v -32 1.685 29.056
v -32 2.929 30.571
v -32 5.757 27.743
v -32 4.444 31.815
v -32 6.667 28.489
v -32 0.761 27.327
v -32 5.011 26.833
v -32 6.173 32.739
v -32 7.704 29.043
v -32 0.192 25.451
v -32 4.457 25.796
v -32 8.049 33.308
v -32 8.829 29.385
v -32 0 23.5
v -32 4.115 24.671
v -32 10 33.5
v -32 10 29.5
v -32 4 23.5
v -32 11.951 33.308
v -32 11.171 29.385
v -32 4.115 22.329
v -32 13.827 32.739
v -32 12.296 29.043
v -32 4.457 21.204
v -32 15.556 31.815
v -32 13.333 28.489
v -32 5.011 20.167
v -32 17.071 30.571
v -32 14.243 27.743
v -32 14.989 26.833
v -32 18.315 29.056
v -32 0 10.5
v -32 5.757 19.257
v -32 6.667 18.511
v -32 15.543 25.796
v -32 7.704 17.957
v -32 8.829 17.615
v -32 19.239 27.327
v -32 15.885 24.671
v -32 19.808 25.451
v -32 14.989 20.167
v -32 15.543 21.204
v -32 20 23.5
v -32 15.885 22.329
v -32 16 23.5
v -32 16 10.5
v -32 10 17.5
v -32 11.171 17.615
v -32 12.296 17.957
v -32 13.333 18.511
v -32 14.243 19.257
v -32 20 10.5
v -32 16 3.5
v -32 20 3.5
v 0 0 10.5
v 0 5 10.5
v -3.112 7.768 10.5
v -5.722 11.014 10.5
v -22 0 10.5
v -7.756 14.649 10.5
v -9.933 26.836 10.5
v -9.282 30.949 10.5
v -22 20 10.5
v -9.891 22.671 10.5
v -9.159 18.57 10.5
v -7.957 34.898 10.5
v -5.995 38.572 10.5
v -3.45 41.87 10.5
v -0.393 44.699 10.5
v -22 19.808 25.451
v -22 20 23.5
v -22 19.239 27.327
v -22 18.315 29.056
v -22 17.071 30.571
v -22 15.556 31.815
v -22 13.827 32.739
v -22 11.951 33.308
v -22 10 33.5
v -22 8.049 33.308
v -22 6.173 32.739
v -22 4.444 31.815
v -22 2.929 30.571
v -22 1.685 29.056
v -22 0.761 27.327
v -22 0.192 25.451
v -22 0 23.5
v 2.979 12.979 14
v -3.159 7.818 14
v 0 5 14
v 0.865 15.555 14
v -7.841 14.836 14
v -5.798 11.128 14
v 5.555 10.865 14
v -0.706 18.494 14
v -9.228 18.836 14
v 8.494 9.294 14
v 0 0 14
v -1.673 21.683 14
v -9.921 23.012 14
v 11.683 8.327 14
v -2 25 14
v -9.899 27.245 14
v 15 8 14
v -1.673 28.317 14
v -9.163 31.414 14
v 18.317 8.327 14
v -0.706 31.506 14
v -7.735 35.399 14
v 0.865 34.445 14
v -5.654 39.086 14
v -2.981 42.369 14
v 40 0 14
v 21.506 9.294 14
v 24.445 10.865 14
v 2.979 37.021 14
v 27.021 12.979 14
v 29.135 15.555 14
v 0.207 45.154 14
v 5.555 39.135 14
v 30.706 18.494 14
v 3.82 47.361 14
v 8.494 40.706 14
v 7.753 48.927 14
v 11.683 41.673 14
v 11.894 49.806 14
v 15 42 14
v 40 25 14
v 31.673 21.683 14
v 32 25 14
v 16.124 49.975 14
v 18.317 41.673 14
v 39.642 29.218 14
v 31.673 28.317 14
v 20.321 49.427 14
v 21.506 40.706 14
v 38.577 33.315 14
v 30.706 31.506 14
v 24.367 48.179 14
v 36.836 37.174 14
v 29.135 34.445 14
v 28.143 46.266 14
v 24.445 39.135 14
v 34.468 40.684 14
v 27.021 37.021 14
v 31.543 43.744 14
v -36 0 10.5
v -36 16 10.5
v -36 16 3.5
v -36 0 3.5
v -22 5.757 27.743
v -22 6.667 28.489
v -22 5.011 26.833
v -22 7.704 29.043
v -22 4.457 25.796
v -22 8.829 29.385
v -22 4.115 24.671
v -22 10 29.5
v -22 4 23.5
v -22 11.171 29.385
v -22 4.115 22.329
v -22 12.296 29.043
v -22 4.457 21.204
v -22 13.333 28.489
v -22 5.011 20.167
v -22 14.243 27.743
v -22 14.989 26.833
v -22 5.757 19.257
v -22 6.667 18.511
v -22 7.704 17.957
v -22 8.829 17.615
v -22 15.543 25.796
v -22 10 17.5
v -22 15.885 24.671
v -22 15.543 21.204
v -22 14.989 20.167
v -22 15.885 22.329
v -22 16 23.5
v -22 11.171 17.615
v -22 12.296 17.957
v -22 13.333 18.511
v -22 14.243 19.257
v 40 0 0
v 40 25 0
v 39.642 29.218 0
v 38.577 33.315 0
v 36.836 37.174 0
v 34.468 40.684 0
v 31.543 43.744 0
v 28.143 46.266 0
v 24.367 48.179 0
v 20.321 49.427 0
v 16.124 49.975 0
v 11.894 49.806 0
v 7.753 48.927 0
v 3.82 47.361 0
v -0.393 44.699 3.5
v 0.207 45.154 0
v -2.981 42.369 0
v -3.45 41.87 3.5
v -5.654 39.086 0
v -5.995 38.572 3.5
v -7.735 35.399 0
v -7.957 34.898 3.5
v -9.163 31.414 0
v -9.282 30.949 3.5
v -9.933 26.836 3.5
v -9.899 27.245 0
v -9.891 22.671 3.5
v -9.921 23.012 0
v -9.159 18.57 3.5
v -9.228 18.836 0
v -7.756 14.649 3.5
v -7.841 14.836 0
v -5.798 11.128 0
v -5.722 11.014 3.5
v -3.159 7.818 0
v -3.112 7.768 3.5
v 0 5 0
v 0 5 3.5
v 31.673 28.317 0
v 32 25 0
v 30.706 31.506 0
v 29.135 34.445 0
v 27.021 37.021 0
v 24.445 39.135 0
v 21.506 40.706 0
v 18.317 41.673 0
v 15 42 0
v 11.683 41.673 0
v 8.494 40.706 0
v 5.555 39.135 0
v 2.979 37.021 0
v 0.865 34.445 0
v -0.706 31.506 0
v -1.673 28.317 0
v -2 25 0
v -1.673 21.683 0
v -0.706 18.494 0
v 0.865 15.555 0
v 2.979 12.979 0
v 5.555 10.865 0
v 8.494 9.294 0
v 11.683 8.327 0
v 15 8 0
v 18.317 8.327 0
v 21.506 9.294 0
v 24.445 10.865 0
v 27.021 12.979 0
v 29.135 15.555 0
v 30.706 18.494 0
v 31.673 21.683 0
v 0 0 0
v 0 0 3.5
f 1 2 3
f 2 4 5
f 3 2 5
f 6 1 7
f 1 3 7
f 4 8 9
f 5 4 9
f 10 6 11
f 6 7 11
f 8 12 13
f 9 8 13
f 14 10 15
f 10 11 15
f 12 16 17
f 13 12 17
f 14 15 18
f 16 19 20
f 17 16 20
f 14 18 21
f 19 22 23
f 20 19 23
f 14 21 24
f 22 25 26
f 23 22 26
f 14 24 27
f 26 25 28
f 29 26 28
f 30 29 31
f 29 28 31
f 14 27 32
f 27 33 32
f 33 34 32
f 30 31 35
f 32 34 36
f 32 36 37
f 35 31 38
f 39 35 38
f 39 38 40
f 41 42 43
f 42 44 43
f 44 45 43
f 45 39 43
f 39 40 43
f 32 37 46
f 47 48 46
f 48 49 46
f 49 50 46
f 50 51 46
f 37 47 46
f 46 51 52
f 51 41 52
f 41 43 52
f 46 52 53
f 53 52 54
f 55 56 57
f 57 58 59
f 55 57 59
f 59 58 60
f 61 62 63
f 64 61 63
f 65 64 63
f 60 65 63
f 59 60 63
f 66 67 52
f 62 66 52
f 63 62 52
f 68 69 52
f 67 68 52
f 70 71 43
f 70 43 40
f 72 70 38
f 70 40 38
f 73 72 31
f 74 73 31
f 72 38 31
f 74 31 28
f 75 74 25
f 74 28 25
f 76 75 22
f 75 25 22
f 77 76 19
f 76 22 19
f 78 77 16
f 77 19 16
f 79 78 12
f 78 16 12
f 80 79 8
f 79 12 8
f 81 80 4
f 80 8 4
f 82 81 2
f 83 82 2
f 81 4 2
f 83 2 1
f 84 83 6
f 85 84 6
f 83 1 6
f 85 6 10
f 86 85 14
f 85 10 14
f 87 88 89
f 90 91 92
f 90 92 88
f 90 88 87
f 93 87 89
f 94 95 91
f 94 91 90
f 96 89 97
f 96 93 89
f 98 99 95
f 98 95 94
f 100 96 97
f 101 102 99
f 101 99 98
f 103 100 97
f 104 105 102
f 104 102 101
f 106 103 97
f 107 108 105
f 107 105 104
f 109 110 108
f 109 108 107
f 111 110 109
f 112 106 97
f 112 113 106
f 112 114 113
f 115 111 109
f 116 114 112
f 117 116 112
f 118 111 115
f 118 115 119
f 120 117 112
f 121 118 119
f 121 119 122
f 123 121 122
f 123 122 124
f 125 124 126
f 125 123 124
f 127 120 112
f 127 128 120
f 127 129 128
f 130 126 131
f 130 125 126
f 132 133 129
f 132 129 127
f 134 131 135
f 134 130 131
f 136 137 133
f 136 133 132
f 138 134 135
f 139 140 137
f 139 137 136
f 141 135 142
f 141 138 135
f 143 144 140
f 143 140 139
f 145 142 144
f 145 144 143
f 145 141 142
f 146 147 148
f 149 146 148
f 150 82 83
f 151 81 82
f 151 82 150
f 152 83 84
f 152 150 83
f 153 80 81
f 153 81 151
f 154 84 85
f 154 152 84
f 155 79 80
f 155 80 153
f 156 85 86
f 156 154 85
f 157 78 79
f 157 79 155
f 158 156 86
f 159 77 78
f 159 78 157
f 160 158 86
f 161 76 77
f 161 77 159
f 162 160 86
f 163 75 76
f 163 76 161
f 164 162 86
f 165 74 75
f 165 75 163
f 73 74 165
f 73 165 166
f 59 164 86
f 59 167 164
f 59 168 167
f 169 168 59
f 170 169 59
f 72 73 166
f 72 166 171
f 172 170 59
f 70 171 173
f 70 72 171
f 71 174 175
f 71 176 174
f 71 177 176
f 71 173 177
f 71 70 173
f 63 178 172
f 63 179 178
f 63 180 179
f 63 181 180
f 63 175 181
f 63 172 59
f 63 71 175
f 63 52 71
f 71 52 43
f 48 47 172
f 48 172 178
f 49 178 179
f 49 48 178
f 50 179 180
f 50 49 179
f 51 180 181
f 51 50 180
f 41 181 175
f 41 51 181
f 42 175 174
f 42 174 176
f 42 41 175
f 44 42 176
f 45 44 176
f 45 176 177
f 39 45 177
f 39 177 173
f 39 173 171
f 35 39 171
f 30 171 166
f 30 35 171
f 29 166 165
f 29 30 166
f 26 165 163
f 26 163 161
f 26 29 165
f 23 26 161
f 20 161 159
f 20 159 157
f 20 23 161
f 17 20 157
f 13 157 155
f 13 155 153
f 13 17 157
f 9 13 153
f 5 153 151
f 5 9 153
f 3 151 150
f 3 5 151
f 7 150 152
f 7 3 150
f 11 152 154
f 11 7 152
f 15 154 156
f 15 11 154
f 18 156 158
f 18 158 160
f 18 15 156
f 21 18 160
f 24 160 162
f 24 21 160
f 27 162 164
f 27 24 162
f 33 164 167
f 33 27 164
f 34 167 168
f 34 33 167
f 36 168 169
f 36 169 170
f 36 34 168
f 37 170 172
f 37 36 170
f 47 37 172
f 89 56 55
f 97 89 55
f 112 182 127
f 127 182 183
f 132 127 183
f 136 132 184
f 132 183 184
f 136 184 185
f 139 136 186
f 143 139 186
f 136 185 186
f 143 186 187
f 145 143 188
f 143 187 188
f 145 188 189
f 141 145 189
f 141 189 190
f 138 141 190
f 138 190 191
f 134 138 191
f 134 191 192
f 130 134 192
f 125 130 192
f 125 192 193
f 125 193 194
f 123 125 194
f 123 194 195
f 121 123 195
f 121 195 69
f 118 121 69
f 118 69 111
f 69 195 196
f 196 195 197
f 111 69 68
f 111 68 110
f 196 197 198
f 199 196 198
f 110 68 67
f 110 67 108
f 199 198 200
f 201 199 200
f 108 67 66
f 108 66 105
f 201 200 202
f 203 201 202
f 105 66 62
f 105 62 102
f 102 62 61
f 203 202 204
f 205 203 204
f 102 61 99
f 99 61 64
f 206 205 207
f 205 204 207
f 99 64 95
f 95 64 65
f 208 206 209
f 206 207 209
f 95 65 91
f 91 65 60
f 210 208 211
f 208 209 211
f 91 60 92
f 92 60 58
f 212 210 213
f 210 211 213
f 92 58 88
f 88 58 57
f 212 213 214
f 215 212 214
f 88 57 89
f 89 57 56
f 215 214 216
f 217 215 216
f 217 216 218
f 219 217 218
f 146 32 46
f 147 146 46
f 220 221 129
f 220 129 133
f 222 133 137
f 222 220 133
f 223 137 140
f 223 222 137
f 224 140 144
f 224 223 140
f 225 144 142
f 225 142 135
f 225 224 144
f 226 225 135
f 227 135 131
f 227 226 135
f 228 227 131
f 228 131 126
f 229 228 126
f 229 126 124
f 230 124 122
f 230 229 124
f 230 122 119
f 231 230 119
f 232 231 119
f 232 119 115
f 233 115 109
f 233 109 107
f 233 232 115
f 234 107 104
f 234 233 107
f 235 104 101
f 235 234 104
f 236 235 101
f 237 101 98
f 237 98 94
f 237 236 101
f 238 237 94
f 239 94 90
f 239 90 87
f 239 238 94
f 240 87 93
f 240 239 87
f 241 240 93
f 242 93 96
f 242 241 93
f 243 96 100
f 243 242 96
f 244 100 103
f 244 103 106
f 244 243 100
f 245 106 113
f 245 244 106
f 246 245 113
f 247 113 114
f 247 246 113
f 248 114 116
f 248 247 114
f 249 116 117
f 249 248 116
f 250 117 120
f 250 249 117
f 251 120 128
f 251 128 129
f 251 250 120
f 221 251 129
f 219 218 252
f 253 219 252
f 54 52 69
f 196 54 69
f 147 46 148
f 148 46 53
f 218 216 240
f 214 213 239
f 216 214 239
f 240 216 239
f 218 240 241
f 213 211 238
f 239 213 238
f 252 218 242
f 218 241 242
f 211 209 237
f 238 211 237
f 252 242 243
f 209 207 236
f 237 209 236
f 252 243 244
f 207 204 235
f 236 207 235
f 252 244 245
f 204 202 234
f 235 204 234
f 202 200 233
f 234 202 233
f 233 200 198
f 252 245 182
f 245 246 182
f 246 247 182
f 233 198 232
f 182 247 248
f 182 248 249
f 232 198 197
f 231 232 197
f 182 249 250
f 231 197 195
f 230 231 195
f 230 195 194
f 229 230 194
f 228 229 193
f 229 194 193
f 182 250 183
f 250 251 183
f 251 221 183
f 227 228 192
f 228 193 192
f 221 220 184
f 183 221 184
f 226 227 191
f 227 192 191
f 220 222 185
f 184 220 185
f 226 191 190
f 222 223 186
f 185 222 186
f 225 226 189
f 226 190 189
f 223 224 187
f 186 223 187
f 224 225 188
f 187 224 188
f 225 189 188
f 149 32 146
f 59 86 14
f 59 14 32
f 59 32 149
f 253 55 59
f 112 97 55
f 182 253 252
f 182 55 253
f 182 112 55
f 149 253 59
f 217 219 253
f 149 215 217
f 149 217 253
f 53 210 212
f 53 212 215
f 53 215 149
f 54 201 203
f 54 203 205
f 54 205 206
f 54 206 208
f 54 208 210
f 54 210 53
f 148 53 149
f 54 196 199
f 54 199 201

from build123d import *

# Parameters (mm, degrees)
IZIM1_R                           = 17
Y_KSEKLIK_EKSTR_ZYON1_DEPTH       = 14
Y_KSEKLIK_EKSTR_ZYON2_DEPTH       = 14
IZIM2_W                           = 7
IZIM2_H                           = 16
Y_KSEKLIK_EKSTR_ZYON3_DEPTH       = 4
IZIM2_3_R                         = 6
Y_KSEKLIK_EKSTR_ZYON4_DEPTH       = 10
Y_KSEKLIK_EKSTR_ZYON11_DEPTH      = 10
Y_KSEKLIK_EKSTR_ZYON11_DEPTH_BACK = 4
IZIM4_W                           = 7
IZIM4_H                           = 16
Y_KSEKLIK_EKSTR_ZYON12_DEPTH      = 3.5


with BuildPart() as part:
    # Çizim1 → Yükseklik-Ekstrüzyon1 (new body)
    with BuildSketch(Plane.XY):
        with BuildLine():
            ThreePointArc((40, 25), (3.819660113, 47.360679775), (0, 5))
            ThreePointArc((0, 5), (7.09430585, 1.282917549), (15, 0))
            ThreePointArc((15, 0), (32.67766953, 7.32233047), (40, 25))
        make_face()
        with Locations((15, 25)):
            Circle(IZIM1_R, mode=Mode.SUBTRACT)
    extrude(amount=Y_KSEKLIK_EKSTR_ZYON1_DEPTH)

    # Çizim1<3> → Yükseklik-Ekstrüzyon2 (add)
    with BuildSketch(Plane.XY):
        with BuildLine():
            Line((0, 5), (0, 0))
            Line((0, 0), (15, 0))
            ThreePointArc((15, 0), (7.09430585, 1.282917549), (0, 5))
        make_face()
        with BuildLine():
            ThreePointArc((40, 25), (32.67766953, 7.32233047), (15, 0))
            Line((15, 0), (40, 0))
            Line((40, 0), (40, 25))
        make_face()
    extrude(amount=Y_KSEKLIK_EKSTR_ZYON2_DEPTH)



with BuildPart() as body_2:
    # Çizim2 → Yükseklik-Ekstrüzyon3 (new body)
    with BuildSketch(Plane(origin=(-32, 0, 0), x_dir=(0, 0, -1), z_dir=(1, 0, 0))):
        with Locations((-7, 8)):
            Rectangle(IZIM2_W, IZIM2_H)
    extrude(amount=Y_KSEKLIK_EKSTR_ZYON3_DEPTH)

    # Çizim2<3> → Yükseklik-Ekstrüzyon4 (add)
    with BuildSketch(Plane(origin=(-32, 0, 0), x_dir=(0, 0, -1), z_dir=(1, 0, 0))):
        with BuildLine():
            Line((-23.5, 0), (-10.5, 0))
            Line((-10.5, 0), (-10.5, 16))
            Line((-10.5, 16), (-3.5, 16))
            Line((-3.5, 16), (-3.5, 20))
            Line((-3.5, 20), (-23.5, 20))
            ThreePointArc((-23.5, 20), (-33.5, 10), (-23.5, 0))
        make_face()
        with Locations((-23.5, 10)):
            Circle(IZIM2_3_R, mode=Mode.SUBTRACT)
    extrude(amount=Y_KSEKLIK_EKSTR_ZYON4_DEPTH)

    # Çizim4 → Yükseklik-Ekstrüzyon11 (add, two sides: drawn at the far end of the back side and taken through both)
    with BuildSketch(Plane(origin=(-32, 0, 0), x_dir=(0, 0, -1), z_dir=(1, 0, 0)).offset(-Y_KSEKLIK_EKSTR_ZYON11_DEPTH_BACK)):
        with Locations((-7, 8)):
            Rectangle(IZIM4_W, IZIM4_H)
    extrude(amount=Y_KSEKLIK_EKSTR_ZYON11_DEPTH + Y_KSEKLIK_EKSTR_ZYON11_DEPTH_BACK)


with BuildPart() as part_1:
    add(part.part)

    add(body_2.part)  # Yükseklik-Ekstrüzyon12 merges body 2
    # Çizim3 → Yükseklik-Ekstrüzyon12 (add, symmetric)
    with BuildSketch(Plane.XY.offset(7)):
        with BuildLine():
            Line((-32, 20), (-0.393483787, 44.698747597))
            ThreePointArc((-0.393483787, 44.698747597), (-9.998772057, 24.752218594), (0, 5))
            Line((0, 5), (0, 0))
            Line((0, 0), (-22, 0))
            Line((-22, 0), (-22, 20))
            Line((-22, 20), (-32, 20))
        make_face()
    extrude(amount=Y_KSEKLIK_EKSTR_ZYON12_DEPTH, both=True)


solid = part_1.part
